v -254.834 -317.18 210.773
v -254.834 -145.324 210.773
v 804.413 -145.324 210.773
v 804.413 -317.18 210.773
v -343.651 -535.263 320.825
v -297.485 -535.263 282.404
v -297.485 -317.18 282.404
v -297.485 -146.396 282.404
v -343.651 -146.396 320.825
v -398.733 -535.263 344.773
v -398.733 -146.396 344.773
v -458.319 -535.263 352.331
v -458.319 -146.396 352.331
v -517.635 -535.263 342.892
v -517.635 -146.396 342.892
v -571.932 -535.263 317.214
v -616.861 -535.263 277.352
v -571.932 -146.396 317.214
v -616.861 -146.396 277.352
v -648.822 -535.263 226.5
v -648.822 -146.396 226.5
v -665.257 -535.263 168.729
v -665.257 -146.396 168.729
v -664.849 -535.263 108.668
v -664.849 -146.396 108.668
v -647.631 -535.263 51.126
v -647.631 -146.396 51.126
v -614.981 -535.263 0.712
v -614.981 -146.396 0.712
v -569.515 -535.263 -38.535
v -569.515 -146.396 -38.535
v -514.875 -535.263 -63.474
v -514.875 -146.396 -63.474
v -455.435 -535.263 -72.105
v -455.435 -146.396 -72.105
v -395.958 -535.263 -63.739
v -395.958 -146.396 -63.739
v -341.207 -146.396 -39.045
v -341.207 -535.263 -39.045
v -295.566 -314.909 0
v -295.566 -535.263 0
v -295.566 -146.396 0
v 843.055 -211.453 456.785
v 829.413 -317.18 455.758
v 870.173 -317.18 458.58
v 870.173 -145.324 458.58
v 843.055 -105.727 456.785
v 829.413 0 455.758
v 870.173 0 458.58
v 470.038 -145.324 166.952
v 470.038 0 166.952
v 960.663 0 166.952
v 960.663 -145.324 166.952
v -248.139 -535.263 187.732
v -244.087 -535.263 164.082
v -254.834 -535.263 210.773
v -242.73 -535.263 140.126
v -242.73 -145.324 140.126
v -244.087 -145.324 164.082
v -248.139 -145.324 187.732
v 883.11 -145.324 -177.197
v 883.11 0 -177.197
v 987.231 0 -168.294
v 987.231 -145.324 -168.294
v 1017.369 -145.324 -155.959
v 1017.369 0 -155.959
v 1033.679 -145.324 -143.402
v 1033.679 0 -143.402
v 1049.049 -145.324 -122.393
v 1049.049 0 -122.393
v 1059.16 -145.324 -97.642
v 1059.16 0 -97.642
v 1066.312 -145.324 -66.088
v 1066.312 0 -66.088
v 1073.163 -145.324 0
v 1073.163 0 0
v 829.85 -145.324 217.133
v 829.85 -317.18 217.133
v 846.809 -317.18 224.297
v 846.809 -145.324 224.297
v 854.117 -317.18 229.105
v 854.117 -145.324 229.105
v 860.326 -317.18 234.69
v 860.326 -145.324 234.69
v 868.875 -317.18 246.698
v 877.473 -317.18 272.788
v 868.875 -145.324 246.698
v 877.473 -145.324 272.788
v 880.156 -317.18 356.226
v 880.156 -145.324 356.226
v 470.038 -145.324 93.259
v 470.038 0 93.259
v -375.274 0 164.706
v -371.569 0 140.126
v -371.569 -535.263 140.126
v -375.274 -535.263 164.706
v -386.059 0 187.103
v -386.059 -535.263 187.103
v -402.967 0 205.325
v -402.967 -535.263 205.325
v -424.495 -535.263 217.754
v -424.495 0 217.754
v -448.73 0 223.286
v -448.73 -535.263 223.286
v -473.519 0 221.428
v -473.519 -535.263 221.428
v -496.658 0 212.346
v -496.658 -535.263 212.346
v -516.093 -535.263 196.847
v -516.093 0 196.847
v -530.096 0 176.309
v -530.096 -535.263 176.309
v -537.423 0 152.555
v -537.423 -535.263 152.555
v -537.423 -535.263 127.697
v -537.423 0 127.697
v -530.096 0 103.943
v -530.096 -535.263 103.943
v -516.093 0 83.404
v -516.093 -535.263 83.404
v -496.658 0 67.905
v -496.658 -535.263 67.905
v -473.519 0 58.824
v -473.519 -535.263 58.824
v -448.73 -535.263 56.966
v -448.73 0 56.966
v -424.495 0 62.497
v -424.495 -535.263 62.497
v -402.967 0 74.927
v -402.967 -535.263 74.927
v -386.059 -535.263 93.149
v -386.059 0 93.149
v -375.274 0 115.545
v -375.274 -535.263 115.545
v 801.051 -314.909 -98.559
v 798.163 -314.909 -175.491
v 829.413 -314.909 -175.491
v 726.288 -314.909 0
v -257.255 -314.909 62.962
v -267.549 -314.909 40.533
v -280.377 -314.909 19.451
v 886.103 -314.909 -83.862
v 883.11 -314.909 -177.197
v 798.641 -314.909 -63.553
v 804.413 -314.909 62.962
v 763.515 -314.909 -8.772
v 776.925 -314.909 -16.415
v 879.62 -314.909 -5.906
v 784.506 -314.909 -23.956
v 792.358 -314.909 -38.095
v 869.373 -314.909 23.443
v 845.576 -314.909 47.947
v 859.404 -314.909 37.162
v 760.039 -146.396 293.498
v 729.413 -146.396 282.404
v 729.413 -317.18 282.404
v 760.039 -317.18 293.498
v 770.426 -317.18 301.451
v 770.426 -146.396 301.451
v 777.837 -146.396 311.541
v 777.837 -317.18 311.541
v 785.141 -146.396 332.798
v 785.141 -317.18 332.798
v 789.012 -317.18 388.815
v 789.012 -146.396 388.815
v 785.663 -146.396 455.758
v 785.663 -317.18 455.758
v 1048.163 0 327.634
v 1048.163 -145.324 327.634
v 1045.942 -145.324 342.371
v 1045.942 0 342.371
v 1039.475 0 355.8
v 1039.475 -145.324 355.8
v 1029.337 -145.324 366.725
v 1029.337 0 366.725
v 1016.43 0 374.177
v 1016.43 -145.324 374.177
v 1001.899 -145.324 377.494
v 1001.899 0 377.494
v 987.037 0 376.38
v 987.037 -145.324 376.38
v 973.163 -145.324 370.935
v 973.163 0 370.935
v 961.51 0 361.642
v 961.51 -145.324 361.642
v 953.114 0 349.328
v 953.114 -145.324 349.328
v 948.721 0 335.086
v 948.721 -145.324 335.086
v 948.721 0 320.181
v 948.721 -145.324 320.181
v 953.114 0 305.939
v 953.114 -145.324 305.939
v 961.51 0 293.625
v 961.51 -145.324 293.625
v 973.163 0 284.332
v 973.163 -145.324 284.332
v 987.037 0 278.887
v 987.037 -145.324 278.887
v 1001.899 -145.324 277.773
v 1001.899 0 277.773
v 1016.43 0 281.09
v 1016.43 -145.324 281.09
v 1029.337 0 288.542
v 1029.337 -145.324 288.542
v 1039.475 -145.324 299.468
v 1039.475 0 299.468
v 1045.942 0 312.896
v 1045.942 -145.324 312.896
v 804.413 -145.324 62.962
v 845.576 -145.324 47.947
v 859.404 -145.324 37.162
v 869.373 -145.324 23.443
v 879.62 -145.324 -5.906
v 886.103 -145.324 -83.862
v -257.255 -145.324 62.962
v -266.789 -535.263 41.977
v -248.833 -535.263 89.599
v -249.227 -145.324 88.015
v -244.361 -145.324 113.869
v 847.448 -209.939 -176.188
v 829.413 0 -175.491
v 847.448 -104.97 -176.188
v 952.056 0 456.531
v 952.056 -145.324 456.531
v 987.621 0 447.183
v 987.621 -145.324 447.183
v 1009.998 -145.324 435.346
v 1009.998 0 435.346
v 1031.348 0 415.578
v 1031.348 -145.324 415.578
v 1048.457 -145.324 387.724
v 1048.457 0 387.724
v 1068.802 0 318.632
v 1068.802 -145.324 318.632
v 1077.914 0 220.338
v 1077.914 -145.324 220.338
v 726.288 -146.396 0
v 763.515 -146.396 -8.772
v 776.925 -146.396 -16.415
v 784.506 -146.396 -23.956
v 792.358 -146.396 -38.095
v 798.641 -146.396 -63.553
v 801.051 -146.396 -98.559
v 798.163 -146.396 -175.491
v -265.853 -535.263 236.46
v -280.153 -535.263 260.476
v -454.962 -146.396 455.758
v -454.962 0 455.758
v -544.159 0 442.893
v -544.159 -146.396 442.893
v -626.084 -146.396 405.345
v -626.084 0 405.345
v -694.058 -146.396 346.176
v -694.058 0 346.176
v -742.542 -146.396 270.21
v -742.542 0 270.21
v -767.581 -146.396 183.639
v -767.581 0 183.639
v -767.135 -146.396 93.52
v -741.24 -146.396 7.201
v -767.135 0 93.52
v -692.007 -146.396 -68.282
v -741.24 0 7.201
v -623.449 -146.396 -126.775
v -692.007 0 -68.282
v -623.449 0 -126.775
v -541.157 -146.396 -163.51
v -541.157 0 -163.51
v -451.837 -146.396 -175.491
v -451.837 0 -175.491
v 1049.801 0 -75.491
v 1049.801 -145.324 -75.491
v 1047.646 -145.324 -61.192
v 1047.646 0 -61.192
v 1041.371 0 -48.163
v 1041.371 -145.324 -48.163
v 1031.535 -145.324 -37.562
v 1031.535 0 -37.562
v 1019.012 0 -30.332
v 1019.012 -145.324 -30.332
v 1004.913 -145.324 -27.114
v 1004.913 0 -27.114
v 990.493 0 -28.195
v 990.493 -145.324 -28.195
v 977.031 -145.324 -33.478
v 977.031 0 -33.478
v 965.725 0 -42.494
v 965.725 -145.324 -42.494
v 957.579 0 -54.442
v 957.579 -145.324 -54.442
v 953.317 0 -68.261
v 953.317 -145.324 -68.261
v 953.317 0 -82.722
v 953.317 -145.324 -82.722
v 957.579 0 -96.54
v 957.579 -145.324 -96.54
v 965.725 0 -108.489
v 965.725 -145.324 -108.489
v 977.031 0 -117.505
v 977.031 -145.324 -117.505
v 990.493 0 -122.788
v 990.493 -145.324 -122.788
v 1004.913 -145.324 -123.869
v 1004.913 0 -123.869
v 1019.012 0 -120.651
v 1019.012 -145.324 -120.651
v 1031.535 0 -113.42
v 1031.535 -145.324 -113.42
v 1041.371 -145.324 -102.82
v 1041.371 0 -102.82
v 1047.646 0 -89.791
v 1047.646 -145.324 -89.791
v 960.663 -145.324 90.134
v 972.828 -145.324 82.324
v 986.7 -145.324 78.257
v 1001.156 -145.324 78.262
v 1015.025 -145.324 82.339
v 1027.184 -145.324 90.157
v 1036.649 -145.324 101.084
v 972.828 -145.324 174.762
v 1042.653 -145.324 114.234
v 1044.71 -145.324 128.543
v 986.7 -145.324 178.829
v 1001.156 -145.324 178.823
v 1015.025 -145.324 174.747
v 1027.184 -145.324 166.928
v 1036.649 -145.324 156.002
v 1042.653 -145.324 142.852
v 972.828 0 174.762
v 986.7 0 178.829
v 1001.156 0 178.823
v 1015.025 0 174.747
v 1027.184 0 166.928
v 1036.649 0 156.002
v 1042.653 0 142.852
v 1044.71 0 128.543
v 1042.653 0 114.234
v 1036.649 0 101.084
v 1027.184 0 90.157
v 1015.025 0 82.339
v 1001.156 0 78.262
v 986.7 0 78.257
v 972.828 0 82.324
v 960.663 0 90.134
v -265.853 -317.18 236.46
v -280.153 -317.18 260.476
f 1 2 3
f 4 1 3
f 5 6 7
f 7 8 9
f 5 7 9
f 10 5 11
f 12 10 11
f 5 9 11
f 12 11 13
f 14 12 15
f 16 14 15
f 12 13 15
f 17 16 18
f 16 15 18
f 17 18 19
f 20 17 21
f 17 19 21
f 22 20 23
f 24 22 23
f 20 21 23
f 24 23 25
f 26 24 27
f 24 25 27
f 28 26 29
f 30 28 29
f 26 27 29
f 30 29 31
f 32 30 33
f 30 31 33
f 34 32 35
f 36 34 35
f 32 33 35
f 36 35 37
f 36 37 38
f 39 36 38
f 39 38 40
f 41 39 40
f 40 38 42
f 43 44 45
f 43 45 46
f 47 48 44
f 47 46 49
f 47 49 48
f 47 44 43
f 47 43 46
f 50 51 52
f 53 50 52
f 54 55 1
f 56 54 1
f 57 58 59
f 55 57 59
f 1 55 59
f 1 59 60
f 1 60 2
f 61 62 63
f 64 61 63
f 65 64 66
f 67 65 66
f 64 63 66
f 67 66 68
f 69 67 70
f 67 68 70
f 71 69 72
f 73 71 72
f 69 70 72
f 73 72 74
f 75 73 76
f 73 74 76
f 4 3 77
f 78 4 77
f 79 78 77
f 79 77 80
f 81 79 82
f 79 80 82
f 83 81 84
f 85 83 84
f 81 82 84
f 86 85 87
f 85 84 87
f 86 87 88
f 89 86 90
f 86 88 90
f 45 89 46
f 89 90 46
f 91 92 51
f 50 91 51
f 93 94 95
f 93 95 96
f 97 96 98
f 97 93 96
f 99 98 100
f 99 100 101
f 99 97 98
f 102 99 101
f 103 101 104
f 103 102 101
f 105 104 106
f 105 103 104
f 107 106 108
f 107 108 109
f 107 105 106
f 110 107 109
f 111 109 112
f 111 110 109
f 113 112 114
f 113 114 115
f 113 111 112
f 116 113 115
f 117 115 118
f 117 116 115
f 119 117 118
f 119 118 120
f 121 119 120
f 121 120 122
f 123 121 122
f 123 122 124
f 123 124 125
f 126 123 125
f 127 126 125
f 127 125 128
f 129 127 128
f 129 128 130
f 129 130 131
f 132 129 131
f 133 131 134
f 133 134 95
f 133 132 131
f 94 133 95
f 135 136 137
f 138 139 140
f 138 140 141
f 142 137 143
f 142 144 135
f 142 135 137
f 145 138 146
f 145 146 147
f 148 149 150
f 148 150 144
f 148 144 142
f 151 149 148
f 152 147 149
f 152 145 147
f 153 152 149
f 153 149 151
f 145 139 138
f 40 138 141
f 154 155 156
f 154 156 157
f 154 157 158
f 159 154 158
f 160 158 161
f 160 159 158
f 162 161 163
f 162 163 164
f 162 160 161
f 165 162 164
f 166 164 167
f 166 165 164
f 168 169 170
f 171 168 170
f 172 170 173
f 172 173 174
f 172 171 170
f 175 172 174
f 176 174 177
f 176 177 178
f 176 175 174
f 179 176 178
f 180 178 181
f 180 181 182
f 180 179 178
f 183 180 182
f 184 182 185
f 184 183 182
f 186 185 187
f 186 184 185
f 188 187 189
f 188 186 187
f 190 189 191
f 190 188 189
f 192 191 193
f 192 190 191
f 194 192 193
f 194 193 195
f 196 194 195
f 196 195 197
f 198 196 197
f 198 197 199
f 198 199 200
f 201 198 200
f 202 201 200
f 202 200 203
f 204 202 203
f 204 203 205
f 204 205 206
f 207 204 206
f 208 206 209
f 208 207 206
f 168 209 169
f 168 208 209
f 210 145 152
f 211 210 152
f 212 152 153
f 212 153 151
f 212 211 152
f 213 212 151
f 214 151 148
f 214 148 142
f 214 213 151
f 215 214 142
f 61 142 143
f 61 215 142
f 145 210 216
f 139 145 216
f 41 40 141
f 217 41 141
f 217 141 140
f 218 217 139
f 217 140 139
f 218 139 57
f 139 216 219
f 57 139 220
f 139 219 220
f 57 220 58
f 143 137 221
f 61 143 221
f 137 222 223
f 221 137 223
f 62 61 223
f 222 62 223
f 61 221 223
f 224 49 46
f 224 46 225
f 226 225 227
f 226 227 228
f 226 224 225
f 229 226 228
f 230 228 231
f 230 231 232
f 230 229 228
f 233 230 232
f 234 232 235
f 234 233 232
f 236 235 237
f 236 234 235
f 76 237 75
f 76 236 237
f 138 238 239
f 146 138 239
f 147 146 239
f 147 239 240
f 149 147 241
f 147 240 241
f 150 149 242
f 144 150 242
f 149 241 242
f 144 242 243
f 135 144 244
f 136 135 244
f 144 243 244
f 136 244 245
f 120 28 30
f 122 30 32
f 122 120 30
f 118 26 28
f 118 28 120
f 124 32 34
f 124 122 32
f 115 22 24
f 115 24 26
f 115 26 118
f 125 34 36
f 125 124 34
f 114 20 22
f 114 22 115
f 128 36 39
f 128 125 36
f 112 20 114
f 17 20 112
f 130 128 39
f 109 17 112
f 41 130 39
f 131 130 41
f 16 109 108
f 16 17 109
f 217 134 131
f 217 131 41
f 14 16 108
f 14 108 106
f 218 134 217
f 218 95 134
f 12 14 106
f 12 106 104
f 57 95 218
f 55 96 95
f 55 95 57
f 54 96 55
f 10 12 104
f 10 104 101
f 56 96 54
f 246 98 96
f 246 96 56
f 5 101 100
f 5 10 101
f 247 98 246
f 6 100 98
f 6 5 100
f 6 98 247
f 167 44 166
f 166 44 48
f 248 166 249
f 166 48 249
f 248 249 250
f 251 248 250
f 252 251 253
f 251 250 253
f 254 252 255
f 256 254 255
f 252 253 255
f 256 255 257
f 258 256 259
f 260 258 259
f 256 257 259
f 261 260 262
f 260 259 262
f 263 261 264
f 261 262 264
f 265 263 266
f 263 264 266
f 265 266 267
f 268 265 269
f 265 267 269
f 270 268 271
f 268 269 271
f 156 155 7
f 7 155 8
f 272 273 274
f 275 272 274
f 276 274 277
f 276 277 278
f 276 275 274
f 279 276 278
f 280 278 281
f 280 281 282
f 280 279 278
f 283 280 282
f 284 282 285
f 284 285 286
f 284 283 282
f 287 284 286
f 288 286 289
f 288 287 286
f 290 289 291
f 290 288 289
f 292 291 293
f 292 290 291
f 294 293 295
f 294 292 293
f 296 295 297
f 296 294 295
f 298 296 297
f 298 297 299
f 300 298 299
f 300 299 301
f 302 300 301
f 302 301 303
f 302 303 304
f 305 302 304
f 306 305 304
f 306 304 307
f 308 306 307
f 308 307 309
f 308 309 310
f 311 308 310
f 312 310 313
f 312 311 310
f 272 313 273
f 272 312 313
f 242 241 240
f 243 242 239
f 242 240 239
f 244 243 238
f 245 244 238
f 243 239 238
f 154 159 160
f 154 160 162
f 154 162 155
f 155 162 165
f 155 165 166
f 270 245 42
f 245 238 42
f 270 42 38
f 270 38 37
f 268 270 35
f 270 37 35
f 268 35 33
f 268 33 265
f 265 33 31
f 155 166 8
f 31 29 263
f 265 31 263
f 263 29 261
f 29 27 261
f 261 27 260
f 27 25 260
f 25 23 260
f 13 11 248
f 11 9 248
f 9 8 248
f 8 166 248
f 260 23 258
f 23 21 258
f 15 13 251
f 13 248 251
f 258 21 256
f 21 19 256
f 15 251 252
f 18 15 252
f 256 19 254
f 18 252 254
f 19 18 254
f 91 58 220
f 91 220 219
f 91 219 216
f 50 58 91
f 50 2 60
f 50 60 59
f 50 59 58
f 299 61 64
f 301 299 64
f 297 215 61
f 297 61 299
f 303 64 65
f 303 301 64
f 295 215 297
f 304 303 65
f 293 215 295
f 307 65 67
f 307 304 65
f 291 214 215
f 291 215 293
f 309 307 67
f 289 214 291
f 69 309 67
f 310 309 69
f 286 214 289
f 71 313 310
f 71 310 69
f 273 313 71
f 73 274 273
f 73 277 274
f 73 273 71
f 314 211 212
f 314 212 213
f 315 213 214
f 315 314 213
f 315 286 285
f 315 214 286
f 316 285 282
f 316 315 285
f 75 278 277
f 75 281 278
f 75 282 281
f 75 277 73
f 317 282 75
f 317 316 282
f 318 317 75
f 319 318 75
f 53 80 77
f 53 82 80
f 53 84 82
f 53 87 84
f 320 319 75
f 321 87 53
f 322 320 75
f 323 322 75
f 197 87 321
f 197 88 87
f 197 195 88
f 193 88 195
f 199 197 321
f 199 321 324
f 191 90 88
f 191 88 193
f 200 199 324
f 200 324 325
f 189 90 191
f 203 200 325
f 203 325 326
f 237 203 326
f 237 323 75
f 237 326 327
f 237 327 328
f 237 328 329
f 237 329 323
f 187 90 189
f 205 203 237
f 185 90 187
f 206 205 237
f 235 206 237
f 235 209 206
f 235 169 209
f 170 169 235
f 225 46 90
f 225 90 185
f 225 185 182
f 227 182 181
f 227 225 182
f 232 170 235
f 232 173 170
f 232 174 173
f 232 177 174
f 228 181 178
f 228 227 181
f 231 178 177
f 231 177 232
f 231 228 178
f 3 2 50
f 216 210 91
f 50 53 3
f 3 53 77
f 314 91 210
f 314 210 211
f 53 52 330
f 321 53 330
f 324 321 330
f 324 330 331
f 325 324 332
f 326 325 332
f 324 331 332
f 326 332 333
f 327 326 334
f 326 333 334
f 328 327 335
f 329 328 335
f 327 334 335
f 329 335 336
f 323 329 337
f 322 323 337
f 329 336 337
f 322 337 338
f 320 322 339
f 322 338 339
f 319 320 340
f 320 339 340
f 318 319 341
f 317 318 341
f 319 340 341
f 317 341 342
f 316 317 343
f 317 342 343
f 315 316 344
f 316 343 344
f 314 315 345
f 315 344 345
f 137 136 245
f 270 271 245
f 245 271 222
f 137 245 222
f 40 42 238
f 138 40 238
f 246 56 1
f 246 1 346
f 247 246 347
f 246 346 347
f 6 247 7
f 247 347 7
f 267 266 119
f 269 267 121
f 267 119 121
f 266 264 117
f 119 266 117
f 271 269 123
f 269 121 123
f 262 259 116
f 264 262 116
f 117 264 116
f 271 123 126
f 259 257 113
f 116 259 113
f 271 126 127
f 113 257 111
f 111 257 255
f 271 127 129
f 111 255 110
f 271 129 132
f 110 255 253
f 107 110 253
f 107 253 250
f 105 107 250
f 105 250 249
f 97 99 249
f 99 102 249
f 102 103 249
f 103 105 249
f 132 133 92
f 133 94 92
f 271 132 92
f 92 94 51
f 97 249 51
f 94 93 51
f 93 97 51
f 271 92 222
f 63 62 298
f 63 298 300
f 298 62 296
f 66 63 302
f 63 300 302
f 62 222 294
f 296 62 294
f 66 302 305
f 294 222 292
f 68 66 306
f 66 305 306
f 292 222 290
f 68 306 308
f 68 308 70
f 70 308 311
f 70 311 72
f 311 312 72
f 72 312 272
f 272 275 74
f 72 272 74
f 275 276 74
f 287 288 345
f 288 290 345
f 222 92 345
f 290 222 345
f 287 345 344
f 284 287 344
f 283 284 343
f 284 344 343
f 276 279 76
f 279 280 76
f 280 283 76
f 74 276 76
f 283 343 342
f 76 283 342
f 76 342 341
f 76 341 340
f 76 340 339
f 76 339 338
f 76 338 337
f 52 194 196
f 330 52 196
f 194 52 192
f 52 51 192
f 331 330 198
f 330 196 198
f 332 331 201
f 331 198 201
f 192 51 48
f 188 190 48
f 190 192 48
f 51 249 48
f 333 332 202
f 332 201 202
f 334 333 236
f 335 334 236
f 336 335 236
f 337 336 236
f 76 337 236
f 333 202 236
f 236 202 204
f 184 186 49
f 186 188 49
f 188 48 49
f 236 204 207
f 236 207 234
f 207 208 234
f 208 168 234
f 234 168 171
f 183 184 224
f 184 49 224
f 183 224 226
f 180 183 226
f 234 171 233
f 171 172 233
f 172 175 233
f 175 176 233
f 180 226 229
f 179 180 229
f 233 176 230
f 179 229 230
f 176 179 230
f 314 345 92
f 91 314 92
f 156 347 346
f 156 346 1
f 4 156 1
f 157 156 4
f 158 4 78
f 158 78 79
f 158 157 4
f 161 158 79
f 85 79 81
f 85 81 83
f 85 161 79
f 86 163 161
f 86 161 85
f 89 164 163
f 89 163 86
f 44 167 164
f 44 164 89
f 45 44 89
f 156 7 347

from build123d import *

# Parameters (mm, degrees)
F1_DEPTH = 146.39604
F0_R     = 83.392936441
F2_DEPTH = 535.26303
F3_DEPTH = 314.9086
F4_DEPTH = 317.17995
F0_R_2   = 48.5130356929
F0_R_3   = 50
F5_DEPTH = 145.32376


with BuildPart() as f1:
    # F0 (on Front) → F1 (new body)
    with BuildSketch(Plane.XZ):
        with BuildLine():
            Line((28.9590880275, -175.4914518826), (798.1629728788, -175.4914518826))
            add(Edge.make_bspline(
                [(726.2878835215, 0), (749.4564260521, -3.6950431615), (807.986100889, -13.0296689571), (801.8625568935, -114.3051358252), (798.1629728788, -175.4914518826)],
                knots=[0, 0, 0, 0, 0.3958426661, 1, 1, 1, 1], degree=3))
            Line((726.2878835215, 0), (-295.5661843732, 0))
            ThreePointArc((-295.5661843732, 0), (-667.1886575617, 138.684058053), (-297.4846392131, 282.4041657406))
            Line((-297.4846392131, 282.4041657406), (729.4129350169, 282.4041657406))
            add(Edge.make_bspline(
                [(729.4129350169, 282.4041657406), (747.6261257194, 287.3140311043), (795.952797715, 300.3418117303), (789.6132360534, 396.0934109874), (785.6629066882, 455.7584753077)],
                knots=[0, 0, 0, 0, 0.3768765766, 1, 1, 1, 1], degree=3))
            Line((785.6629066882, 455.7584753077), (-454.9619642401, 455.7584753077))
            ThreePointArc((-454.9619642401, 455.7584753077), (-770.5907953617, 138.5632624305), (-451.8369741687, -175.4914518826))
            Line((-451.8369741687, -175.4914518826), (28.9590880275, -175.4914518826))
        make_face()
    extrude(amount=F1_DEPTH)

    # F0 (on Front) → F2 (join)
    with BuildSketch(Plane.XZ):
        with BuildLine():
            ThreePointArc((-297.4846392131, 282.4041657406), (-667.1886575617, 138.684058053), (-295.5661843732, 0))
            ThreePointArc((-295.5661843732, 0), (-273.656680853, 29.8051433358), (-257.2551892643, 62.9618016028))
            ThreePointArc((-257.2551892643, 62.9618016028), (-246.3931852105, 100.8662258675), (-242.7303739653, 140.1257766123))
            ThreePointArc((-242.7303739653, 140.1257766123), (-245.778146476, 175.9640005668), (-254.8339283377, 210.7729078804))
            ThreePointArc((-254.8339283377, 210.7729078804), (-272.6074802891, 248.703352997), (-297.4846392131, 282.4041657406))
        make_face()
        with Locations((-454.9619642401, 140.1257766123)):
            Circle(F0_R, mode=Mode.SUBTRACT)
    extrude(amount=F2_DEPTH)

    # F0 (on Front) → F3 (join)
    with BuildSketch(Plane.XZ):
        with BuildLine():
            Line((798.1629728788, -175.4914518826), (829.4129794979, -175.4914518826))
            add(Edge.make_bspline(
                [(829.4129794979, -175.4914518826), (847.465214072, -176.203771441), (865.5174486461, -176.9160909994), (883.1099902927, -177.1965162426)],
                knots=[0, 0, 0, 0, 0.1205058402, 0.1205058402, 0.1205058402, 0.1205058402], degree=3))
            add(Edge.make_bspline(
                [(804.4128486555, 62.9618016028), (828.5267205054, 56.4951891145), (893.4177428317, 39.0775894842), (887.0936826735, -93.6873293316), (883.1099902927, -177.1965162426)],
                knots=[0, 0, 0, 0, 0.3715086385, 1, 1, 1, 1], degree=3))
            Line((804.4128486555, 62.9618016028), (-257.2551892643, 62.9618016028))
            ThreePointArc((-257.2551892643, 62.9618016028), (-273.656680853, 29.8051433358), (-295.5661843732, 0))
            Line((-295.5661843732, 0), (726.2878835215, 0))
            add(Edge.make_bspline(
                [(726.2878835215, 0), (749.4564260521, -3.6950431615), (807.986100889, -13.0296689571), (801.8625568935, -114.3051358252), (798.1629728788, -175.4914518826)],
                knots=[0, 0, 0, 0, 0.3958426661, 1, 1, 1, 1], degree=3))
        make_face()
    extrude(amount=F3_DEPTH)

    # F0 (on Front) → F4 (join)
    with BuildSketch(Plane.XZ):
        with BuildLine():
            add(Edge.make_bspline(
                [(804.4128476405, 210.7729078804), (828.9197638548, 216.1039467831), (896.2936796349, 230.7451115899), (880.3220514089, 370.0353389293), (870.172874346, 458.57987889)],
                knots=[0, 0, 0, 0, 0.363835826, 1, 1, 1, 1], degree=3))
            add(Edge.make_bspline(
                [(829.4129794979, 455.7584753077), (843.0623410115, 456.7960447436), (856.7117025252, 457.8336141794), (870.172874346, 458.57987889)],
                knots=[0, 0, 0, 0, 0.0723496884, 0.0723496884, 0.0723496884, 0.0723496884], degree=3))
            Line((829.4129794979, 455.7584753077), (785.6629066882, 455.7584753077))
            add(Edge.make_bspline(
                [(729.4129350169, 282.4041657406), (747.6261257194, 287.3140311043), (795.952797715, 300.3418117303), (789.6132360534, 396.0934109874), (785.6629066882, 455.7584753077)],
                knots=[0, 0, 0, 0, 0.3768765766, 1, 1, 1, 1], degree=3))
            Line((729.4129350169, 282.4041657406), (-297.4846392131, 282.4041657406))
            ThreePointArc((-297.4846392131, 282.4041657406), (-272.6074802891, 248.703352997), (-254.8339283377, 210.7729078804))
            Line((-254.8339283377, 210.7729078804), (804.4128476405, 210.7729078804))
        make_face()
    extrude(amount=F4_DEPTH)

    # F0 (on Front) → F5 (join)
    with BuildSketch(Plane.XZ):
        with BuildLine():
            add(Edge.make_bspline(
                [(804.4128486555, 62.9618016028), (828.5267205054, 56.4951891145), (893.4177428317, 39.0775894842), (887.0936826735, -93.6873293316), (883.1099902927, -177.1965162426)],
                knots=[0, 0, 0, 0, 0.3715086385, 1, 1, 1, 1], degree=3))
            add(Edge.make_bspline(
                [(883.1099902927, -177.1965162426), (943.4852931991, -178.1588990152), (1060.3679465943, -169.3878874077), (1068.7319224793, -58.6605543312), (1073.1629464026, 0)],
                knots=[0.1205058402, 0.1205058402, 0.1205058402, 0.1205058402, 0.5340661288, 1, 1, 1, 1], degree=3))
            add(Edge.make_bspline(
                [(870.172874346, 458.57987889), (932.4516179308, 462.0325076192), (1093.8840254449, 454.3206002683), (1081.2427804982, 177.1546292987), (1073.1629464026, 0)],
                knots=[0.0723496884, 0.0723496884, 0.0723496884, 0.0723496884, 0.4070789192, 1, 1, 1, 1], degree=3))
            add(Edge.make_bspline(
                [(804.4128476405, 210.7729078804), (828.9197638548, 216.1039467831), (896.2936796349, 230.7451115899), (880.3220514089, 370.0353389293), (870.172874346, 458.57987889)],
                knots=[0, 0, 0, 0, 0.363835826, 1, 1, 1, 1], degree=3))
            Line((804.4128476405, 210.7729078804), (-254.8339283377, 210.7729078804))
            ThreePointArc((-254.8339283377, 210.7729078804), (-245.778146476, 175.9640005668), (-242.7303739653, 140.1257766123))
            ThreePointArc((-242.7303739653, 140.1257766123), (-246.3931852105, 100.8662258675), (-257.2551892643, 62.9618016028))
            Line((-257.2551892643, 62.9618016028), (804.4128486555, 62.9618016028))
        make_face()
        with Locations((1001.2879099977, -75.4914651207)):
            Circle(F0_R_2, mode=Mode.SUBTRACT)
        with BuildLine():
            ThreePointArc((960.662880212, 166.9520690404), (1044.7099487557, 128.542793686), (960.662880212, 90.1335183316))
            Line((960.662880212, 90.1335183316), (470.0379563312, 93.2585150221))
            Line((470.0379563312, 93.2585150221), (470.0379563312, 166.9520690404))
            Line((470.0379563312, 166.9520690404), (960.662880212, 166.9520690404))
        make_face(mode=Mode.SUBTRACT)
        with Locations((998.1628669739, 327.6335117126)):
            Circle(F0_R_3, mode=Mode.SUBTRACT)
    extrude(amount=F5_DEPTH)


solid = f1.part
